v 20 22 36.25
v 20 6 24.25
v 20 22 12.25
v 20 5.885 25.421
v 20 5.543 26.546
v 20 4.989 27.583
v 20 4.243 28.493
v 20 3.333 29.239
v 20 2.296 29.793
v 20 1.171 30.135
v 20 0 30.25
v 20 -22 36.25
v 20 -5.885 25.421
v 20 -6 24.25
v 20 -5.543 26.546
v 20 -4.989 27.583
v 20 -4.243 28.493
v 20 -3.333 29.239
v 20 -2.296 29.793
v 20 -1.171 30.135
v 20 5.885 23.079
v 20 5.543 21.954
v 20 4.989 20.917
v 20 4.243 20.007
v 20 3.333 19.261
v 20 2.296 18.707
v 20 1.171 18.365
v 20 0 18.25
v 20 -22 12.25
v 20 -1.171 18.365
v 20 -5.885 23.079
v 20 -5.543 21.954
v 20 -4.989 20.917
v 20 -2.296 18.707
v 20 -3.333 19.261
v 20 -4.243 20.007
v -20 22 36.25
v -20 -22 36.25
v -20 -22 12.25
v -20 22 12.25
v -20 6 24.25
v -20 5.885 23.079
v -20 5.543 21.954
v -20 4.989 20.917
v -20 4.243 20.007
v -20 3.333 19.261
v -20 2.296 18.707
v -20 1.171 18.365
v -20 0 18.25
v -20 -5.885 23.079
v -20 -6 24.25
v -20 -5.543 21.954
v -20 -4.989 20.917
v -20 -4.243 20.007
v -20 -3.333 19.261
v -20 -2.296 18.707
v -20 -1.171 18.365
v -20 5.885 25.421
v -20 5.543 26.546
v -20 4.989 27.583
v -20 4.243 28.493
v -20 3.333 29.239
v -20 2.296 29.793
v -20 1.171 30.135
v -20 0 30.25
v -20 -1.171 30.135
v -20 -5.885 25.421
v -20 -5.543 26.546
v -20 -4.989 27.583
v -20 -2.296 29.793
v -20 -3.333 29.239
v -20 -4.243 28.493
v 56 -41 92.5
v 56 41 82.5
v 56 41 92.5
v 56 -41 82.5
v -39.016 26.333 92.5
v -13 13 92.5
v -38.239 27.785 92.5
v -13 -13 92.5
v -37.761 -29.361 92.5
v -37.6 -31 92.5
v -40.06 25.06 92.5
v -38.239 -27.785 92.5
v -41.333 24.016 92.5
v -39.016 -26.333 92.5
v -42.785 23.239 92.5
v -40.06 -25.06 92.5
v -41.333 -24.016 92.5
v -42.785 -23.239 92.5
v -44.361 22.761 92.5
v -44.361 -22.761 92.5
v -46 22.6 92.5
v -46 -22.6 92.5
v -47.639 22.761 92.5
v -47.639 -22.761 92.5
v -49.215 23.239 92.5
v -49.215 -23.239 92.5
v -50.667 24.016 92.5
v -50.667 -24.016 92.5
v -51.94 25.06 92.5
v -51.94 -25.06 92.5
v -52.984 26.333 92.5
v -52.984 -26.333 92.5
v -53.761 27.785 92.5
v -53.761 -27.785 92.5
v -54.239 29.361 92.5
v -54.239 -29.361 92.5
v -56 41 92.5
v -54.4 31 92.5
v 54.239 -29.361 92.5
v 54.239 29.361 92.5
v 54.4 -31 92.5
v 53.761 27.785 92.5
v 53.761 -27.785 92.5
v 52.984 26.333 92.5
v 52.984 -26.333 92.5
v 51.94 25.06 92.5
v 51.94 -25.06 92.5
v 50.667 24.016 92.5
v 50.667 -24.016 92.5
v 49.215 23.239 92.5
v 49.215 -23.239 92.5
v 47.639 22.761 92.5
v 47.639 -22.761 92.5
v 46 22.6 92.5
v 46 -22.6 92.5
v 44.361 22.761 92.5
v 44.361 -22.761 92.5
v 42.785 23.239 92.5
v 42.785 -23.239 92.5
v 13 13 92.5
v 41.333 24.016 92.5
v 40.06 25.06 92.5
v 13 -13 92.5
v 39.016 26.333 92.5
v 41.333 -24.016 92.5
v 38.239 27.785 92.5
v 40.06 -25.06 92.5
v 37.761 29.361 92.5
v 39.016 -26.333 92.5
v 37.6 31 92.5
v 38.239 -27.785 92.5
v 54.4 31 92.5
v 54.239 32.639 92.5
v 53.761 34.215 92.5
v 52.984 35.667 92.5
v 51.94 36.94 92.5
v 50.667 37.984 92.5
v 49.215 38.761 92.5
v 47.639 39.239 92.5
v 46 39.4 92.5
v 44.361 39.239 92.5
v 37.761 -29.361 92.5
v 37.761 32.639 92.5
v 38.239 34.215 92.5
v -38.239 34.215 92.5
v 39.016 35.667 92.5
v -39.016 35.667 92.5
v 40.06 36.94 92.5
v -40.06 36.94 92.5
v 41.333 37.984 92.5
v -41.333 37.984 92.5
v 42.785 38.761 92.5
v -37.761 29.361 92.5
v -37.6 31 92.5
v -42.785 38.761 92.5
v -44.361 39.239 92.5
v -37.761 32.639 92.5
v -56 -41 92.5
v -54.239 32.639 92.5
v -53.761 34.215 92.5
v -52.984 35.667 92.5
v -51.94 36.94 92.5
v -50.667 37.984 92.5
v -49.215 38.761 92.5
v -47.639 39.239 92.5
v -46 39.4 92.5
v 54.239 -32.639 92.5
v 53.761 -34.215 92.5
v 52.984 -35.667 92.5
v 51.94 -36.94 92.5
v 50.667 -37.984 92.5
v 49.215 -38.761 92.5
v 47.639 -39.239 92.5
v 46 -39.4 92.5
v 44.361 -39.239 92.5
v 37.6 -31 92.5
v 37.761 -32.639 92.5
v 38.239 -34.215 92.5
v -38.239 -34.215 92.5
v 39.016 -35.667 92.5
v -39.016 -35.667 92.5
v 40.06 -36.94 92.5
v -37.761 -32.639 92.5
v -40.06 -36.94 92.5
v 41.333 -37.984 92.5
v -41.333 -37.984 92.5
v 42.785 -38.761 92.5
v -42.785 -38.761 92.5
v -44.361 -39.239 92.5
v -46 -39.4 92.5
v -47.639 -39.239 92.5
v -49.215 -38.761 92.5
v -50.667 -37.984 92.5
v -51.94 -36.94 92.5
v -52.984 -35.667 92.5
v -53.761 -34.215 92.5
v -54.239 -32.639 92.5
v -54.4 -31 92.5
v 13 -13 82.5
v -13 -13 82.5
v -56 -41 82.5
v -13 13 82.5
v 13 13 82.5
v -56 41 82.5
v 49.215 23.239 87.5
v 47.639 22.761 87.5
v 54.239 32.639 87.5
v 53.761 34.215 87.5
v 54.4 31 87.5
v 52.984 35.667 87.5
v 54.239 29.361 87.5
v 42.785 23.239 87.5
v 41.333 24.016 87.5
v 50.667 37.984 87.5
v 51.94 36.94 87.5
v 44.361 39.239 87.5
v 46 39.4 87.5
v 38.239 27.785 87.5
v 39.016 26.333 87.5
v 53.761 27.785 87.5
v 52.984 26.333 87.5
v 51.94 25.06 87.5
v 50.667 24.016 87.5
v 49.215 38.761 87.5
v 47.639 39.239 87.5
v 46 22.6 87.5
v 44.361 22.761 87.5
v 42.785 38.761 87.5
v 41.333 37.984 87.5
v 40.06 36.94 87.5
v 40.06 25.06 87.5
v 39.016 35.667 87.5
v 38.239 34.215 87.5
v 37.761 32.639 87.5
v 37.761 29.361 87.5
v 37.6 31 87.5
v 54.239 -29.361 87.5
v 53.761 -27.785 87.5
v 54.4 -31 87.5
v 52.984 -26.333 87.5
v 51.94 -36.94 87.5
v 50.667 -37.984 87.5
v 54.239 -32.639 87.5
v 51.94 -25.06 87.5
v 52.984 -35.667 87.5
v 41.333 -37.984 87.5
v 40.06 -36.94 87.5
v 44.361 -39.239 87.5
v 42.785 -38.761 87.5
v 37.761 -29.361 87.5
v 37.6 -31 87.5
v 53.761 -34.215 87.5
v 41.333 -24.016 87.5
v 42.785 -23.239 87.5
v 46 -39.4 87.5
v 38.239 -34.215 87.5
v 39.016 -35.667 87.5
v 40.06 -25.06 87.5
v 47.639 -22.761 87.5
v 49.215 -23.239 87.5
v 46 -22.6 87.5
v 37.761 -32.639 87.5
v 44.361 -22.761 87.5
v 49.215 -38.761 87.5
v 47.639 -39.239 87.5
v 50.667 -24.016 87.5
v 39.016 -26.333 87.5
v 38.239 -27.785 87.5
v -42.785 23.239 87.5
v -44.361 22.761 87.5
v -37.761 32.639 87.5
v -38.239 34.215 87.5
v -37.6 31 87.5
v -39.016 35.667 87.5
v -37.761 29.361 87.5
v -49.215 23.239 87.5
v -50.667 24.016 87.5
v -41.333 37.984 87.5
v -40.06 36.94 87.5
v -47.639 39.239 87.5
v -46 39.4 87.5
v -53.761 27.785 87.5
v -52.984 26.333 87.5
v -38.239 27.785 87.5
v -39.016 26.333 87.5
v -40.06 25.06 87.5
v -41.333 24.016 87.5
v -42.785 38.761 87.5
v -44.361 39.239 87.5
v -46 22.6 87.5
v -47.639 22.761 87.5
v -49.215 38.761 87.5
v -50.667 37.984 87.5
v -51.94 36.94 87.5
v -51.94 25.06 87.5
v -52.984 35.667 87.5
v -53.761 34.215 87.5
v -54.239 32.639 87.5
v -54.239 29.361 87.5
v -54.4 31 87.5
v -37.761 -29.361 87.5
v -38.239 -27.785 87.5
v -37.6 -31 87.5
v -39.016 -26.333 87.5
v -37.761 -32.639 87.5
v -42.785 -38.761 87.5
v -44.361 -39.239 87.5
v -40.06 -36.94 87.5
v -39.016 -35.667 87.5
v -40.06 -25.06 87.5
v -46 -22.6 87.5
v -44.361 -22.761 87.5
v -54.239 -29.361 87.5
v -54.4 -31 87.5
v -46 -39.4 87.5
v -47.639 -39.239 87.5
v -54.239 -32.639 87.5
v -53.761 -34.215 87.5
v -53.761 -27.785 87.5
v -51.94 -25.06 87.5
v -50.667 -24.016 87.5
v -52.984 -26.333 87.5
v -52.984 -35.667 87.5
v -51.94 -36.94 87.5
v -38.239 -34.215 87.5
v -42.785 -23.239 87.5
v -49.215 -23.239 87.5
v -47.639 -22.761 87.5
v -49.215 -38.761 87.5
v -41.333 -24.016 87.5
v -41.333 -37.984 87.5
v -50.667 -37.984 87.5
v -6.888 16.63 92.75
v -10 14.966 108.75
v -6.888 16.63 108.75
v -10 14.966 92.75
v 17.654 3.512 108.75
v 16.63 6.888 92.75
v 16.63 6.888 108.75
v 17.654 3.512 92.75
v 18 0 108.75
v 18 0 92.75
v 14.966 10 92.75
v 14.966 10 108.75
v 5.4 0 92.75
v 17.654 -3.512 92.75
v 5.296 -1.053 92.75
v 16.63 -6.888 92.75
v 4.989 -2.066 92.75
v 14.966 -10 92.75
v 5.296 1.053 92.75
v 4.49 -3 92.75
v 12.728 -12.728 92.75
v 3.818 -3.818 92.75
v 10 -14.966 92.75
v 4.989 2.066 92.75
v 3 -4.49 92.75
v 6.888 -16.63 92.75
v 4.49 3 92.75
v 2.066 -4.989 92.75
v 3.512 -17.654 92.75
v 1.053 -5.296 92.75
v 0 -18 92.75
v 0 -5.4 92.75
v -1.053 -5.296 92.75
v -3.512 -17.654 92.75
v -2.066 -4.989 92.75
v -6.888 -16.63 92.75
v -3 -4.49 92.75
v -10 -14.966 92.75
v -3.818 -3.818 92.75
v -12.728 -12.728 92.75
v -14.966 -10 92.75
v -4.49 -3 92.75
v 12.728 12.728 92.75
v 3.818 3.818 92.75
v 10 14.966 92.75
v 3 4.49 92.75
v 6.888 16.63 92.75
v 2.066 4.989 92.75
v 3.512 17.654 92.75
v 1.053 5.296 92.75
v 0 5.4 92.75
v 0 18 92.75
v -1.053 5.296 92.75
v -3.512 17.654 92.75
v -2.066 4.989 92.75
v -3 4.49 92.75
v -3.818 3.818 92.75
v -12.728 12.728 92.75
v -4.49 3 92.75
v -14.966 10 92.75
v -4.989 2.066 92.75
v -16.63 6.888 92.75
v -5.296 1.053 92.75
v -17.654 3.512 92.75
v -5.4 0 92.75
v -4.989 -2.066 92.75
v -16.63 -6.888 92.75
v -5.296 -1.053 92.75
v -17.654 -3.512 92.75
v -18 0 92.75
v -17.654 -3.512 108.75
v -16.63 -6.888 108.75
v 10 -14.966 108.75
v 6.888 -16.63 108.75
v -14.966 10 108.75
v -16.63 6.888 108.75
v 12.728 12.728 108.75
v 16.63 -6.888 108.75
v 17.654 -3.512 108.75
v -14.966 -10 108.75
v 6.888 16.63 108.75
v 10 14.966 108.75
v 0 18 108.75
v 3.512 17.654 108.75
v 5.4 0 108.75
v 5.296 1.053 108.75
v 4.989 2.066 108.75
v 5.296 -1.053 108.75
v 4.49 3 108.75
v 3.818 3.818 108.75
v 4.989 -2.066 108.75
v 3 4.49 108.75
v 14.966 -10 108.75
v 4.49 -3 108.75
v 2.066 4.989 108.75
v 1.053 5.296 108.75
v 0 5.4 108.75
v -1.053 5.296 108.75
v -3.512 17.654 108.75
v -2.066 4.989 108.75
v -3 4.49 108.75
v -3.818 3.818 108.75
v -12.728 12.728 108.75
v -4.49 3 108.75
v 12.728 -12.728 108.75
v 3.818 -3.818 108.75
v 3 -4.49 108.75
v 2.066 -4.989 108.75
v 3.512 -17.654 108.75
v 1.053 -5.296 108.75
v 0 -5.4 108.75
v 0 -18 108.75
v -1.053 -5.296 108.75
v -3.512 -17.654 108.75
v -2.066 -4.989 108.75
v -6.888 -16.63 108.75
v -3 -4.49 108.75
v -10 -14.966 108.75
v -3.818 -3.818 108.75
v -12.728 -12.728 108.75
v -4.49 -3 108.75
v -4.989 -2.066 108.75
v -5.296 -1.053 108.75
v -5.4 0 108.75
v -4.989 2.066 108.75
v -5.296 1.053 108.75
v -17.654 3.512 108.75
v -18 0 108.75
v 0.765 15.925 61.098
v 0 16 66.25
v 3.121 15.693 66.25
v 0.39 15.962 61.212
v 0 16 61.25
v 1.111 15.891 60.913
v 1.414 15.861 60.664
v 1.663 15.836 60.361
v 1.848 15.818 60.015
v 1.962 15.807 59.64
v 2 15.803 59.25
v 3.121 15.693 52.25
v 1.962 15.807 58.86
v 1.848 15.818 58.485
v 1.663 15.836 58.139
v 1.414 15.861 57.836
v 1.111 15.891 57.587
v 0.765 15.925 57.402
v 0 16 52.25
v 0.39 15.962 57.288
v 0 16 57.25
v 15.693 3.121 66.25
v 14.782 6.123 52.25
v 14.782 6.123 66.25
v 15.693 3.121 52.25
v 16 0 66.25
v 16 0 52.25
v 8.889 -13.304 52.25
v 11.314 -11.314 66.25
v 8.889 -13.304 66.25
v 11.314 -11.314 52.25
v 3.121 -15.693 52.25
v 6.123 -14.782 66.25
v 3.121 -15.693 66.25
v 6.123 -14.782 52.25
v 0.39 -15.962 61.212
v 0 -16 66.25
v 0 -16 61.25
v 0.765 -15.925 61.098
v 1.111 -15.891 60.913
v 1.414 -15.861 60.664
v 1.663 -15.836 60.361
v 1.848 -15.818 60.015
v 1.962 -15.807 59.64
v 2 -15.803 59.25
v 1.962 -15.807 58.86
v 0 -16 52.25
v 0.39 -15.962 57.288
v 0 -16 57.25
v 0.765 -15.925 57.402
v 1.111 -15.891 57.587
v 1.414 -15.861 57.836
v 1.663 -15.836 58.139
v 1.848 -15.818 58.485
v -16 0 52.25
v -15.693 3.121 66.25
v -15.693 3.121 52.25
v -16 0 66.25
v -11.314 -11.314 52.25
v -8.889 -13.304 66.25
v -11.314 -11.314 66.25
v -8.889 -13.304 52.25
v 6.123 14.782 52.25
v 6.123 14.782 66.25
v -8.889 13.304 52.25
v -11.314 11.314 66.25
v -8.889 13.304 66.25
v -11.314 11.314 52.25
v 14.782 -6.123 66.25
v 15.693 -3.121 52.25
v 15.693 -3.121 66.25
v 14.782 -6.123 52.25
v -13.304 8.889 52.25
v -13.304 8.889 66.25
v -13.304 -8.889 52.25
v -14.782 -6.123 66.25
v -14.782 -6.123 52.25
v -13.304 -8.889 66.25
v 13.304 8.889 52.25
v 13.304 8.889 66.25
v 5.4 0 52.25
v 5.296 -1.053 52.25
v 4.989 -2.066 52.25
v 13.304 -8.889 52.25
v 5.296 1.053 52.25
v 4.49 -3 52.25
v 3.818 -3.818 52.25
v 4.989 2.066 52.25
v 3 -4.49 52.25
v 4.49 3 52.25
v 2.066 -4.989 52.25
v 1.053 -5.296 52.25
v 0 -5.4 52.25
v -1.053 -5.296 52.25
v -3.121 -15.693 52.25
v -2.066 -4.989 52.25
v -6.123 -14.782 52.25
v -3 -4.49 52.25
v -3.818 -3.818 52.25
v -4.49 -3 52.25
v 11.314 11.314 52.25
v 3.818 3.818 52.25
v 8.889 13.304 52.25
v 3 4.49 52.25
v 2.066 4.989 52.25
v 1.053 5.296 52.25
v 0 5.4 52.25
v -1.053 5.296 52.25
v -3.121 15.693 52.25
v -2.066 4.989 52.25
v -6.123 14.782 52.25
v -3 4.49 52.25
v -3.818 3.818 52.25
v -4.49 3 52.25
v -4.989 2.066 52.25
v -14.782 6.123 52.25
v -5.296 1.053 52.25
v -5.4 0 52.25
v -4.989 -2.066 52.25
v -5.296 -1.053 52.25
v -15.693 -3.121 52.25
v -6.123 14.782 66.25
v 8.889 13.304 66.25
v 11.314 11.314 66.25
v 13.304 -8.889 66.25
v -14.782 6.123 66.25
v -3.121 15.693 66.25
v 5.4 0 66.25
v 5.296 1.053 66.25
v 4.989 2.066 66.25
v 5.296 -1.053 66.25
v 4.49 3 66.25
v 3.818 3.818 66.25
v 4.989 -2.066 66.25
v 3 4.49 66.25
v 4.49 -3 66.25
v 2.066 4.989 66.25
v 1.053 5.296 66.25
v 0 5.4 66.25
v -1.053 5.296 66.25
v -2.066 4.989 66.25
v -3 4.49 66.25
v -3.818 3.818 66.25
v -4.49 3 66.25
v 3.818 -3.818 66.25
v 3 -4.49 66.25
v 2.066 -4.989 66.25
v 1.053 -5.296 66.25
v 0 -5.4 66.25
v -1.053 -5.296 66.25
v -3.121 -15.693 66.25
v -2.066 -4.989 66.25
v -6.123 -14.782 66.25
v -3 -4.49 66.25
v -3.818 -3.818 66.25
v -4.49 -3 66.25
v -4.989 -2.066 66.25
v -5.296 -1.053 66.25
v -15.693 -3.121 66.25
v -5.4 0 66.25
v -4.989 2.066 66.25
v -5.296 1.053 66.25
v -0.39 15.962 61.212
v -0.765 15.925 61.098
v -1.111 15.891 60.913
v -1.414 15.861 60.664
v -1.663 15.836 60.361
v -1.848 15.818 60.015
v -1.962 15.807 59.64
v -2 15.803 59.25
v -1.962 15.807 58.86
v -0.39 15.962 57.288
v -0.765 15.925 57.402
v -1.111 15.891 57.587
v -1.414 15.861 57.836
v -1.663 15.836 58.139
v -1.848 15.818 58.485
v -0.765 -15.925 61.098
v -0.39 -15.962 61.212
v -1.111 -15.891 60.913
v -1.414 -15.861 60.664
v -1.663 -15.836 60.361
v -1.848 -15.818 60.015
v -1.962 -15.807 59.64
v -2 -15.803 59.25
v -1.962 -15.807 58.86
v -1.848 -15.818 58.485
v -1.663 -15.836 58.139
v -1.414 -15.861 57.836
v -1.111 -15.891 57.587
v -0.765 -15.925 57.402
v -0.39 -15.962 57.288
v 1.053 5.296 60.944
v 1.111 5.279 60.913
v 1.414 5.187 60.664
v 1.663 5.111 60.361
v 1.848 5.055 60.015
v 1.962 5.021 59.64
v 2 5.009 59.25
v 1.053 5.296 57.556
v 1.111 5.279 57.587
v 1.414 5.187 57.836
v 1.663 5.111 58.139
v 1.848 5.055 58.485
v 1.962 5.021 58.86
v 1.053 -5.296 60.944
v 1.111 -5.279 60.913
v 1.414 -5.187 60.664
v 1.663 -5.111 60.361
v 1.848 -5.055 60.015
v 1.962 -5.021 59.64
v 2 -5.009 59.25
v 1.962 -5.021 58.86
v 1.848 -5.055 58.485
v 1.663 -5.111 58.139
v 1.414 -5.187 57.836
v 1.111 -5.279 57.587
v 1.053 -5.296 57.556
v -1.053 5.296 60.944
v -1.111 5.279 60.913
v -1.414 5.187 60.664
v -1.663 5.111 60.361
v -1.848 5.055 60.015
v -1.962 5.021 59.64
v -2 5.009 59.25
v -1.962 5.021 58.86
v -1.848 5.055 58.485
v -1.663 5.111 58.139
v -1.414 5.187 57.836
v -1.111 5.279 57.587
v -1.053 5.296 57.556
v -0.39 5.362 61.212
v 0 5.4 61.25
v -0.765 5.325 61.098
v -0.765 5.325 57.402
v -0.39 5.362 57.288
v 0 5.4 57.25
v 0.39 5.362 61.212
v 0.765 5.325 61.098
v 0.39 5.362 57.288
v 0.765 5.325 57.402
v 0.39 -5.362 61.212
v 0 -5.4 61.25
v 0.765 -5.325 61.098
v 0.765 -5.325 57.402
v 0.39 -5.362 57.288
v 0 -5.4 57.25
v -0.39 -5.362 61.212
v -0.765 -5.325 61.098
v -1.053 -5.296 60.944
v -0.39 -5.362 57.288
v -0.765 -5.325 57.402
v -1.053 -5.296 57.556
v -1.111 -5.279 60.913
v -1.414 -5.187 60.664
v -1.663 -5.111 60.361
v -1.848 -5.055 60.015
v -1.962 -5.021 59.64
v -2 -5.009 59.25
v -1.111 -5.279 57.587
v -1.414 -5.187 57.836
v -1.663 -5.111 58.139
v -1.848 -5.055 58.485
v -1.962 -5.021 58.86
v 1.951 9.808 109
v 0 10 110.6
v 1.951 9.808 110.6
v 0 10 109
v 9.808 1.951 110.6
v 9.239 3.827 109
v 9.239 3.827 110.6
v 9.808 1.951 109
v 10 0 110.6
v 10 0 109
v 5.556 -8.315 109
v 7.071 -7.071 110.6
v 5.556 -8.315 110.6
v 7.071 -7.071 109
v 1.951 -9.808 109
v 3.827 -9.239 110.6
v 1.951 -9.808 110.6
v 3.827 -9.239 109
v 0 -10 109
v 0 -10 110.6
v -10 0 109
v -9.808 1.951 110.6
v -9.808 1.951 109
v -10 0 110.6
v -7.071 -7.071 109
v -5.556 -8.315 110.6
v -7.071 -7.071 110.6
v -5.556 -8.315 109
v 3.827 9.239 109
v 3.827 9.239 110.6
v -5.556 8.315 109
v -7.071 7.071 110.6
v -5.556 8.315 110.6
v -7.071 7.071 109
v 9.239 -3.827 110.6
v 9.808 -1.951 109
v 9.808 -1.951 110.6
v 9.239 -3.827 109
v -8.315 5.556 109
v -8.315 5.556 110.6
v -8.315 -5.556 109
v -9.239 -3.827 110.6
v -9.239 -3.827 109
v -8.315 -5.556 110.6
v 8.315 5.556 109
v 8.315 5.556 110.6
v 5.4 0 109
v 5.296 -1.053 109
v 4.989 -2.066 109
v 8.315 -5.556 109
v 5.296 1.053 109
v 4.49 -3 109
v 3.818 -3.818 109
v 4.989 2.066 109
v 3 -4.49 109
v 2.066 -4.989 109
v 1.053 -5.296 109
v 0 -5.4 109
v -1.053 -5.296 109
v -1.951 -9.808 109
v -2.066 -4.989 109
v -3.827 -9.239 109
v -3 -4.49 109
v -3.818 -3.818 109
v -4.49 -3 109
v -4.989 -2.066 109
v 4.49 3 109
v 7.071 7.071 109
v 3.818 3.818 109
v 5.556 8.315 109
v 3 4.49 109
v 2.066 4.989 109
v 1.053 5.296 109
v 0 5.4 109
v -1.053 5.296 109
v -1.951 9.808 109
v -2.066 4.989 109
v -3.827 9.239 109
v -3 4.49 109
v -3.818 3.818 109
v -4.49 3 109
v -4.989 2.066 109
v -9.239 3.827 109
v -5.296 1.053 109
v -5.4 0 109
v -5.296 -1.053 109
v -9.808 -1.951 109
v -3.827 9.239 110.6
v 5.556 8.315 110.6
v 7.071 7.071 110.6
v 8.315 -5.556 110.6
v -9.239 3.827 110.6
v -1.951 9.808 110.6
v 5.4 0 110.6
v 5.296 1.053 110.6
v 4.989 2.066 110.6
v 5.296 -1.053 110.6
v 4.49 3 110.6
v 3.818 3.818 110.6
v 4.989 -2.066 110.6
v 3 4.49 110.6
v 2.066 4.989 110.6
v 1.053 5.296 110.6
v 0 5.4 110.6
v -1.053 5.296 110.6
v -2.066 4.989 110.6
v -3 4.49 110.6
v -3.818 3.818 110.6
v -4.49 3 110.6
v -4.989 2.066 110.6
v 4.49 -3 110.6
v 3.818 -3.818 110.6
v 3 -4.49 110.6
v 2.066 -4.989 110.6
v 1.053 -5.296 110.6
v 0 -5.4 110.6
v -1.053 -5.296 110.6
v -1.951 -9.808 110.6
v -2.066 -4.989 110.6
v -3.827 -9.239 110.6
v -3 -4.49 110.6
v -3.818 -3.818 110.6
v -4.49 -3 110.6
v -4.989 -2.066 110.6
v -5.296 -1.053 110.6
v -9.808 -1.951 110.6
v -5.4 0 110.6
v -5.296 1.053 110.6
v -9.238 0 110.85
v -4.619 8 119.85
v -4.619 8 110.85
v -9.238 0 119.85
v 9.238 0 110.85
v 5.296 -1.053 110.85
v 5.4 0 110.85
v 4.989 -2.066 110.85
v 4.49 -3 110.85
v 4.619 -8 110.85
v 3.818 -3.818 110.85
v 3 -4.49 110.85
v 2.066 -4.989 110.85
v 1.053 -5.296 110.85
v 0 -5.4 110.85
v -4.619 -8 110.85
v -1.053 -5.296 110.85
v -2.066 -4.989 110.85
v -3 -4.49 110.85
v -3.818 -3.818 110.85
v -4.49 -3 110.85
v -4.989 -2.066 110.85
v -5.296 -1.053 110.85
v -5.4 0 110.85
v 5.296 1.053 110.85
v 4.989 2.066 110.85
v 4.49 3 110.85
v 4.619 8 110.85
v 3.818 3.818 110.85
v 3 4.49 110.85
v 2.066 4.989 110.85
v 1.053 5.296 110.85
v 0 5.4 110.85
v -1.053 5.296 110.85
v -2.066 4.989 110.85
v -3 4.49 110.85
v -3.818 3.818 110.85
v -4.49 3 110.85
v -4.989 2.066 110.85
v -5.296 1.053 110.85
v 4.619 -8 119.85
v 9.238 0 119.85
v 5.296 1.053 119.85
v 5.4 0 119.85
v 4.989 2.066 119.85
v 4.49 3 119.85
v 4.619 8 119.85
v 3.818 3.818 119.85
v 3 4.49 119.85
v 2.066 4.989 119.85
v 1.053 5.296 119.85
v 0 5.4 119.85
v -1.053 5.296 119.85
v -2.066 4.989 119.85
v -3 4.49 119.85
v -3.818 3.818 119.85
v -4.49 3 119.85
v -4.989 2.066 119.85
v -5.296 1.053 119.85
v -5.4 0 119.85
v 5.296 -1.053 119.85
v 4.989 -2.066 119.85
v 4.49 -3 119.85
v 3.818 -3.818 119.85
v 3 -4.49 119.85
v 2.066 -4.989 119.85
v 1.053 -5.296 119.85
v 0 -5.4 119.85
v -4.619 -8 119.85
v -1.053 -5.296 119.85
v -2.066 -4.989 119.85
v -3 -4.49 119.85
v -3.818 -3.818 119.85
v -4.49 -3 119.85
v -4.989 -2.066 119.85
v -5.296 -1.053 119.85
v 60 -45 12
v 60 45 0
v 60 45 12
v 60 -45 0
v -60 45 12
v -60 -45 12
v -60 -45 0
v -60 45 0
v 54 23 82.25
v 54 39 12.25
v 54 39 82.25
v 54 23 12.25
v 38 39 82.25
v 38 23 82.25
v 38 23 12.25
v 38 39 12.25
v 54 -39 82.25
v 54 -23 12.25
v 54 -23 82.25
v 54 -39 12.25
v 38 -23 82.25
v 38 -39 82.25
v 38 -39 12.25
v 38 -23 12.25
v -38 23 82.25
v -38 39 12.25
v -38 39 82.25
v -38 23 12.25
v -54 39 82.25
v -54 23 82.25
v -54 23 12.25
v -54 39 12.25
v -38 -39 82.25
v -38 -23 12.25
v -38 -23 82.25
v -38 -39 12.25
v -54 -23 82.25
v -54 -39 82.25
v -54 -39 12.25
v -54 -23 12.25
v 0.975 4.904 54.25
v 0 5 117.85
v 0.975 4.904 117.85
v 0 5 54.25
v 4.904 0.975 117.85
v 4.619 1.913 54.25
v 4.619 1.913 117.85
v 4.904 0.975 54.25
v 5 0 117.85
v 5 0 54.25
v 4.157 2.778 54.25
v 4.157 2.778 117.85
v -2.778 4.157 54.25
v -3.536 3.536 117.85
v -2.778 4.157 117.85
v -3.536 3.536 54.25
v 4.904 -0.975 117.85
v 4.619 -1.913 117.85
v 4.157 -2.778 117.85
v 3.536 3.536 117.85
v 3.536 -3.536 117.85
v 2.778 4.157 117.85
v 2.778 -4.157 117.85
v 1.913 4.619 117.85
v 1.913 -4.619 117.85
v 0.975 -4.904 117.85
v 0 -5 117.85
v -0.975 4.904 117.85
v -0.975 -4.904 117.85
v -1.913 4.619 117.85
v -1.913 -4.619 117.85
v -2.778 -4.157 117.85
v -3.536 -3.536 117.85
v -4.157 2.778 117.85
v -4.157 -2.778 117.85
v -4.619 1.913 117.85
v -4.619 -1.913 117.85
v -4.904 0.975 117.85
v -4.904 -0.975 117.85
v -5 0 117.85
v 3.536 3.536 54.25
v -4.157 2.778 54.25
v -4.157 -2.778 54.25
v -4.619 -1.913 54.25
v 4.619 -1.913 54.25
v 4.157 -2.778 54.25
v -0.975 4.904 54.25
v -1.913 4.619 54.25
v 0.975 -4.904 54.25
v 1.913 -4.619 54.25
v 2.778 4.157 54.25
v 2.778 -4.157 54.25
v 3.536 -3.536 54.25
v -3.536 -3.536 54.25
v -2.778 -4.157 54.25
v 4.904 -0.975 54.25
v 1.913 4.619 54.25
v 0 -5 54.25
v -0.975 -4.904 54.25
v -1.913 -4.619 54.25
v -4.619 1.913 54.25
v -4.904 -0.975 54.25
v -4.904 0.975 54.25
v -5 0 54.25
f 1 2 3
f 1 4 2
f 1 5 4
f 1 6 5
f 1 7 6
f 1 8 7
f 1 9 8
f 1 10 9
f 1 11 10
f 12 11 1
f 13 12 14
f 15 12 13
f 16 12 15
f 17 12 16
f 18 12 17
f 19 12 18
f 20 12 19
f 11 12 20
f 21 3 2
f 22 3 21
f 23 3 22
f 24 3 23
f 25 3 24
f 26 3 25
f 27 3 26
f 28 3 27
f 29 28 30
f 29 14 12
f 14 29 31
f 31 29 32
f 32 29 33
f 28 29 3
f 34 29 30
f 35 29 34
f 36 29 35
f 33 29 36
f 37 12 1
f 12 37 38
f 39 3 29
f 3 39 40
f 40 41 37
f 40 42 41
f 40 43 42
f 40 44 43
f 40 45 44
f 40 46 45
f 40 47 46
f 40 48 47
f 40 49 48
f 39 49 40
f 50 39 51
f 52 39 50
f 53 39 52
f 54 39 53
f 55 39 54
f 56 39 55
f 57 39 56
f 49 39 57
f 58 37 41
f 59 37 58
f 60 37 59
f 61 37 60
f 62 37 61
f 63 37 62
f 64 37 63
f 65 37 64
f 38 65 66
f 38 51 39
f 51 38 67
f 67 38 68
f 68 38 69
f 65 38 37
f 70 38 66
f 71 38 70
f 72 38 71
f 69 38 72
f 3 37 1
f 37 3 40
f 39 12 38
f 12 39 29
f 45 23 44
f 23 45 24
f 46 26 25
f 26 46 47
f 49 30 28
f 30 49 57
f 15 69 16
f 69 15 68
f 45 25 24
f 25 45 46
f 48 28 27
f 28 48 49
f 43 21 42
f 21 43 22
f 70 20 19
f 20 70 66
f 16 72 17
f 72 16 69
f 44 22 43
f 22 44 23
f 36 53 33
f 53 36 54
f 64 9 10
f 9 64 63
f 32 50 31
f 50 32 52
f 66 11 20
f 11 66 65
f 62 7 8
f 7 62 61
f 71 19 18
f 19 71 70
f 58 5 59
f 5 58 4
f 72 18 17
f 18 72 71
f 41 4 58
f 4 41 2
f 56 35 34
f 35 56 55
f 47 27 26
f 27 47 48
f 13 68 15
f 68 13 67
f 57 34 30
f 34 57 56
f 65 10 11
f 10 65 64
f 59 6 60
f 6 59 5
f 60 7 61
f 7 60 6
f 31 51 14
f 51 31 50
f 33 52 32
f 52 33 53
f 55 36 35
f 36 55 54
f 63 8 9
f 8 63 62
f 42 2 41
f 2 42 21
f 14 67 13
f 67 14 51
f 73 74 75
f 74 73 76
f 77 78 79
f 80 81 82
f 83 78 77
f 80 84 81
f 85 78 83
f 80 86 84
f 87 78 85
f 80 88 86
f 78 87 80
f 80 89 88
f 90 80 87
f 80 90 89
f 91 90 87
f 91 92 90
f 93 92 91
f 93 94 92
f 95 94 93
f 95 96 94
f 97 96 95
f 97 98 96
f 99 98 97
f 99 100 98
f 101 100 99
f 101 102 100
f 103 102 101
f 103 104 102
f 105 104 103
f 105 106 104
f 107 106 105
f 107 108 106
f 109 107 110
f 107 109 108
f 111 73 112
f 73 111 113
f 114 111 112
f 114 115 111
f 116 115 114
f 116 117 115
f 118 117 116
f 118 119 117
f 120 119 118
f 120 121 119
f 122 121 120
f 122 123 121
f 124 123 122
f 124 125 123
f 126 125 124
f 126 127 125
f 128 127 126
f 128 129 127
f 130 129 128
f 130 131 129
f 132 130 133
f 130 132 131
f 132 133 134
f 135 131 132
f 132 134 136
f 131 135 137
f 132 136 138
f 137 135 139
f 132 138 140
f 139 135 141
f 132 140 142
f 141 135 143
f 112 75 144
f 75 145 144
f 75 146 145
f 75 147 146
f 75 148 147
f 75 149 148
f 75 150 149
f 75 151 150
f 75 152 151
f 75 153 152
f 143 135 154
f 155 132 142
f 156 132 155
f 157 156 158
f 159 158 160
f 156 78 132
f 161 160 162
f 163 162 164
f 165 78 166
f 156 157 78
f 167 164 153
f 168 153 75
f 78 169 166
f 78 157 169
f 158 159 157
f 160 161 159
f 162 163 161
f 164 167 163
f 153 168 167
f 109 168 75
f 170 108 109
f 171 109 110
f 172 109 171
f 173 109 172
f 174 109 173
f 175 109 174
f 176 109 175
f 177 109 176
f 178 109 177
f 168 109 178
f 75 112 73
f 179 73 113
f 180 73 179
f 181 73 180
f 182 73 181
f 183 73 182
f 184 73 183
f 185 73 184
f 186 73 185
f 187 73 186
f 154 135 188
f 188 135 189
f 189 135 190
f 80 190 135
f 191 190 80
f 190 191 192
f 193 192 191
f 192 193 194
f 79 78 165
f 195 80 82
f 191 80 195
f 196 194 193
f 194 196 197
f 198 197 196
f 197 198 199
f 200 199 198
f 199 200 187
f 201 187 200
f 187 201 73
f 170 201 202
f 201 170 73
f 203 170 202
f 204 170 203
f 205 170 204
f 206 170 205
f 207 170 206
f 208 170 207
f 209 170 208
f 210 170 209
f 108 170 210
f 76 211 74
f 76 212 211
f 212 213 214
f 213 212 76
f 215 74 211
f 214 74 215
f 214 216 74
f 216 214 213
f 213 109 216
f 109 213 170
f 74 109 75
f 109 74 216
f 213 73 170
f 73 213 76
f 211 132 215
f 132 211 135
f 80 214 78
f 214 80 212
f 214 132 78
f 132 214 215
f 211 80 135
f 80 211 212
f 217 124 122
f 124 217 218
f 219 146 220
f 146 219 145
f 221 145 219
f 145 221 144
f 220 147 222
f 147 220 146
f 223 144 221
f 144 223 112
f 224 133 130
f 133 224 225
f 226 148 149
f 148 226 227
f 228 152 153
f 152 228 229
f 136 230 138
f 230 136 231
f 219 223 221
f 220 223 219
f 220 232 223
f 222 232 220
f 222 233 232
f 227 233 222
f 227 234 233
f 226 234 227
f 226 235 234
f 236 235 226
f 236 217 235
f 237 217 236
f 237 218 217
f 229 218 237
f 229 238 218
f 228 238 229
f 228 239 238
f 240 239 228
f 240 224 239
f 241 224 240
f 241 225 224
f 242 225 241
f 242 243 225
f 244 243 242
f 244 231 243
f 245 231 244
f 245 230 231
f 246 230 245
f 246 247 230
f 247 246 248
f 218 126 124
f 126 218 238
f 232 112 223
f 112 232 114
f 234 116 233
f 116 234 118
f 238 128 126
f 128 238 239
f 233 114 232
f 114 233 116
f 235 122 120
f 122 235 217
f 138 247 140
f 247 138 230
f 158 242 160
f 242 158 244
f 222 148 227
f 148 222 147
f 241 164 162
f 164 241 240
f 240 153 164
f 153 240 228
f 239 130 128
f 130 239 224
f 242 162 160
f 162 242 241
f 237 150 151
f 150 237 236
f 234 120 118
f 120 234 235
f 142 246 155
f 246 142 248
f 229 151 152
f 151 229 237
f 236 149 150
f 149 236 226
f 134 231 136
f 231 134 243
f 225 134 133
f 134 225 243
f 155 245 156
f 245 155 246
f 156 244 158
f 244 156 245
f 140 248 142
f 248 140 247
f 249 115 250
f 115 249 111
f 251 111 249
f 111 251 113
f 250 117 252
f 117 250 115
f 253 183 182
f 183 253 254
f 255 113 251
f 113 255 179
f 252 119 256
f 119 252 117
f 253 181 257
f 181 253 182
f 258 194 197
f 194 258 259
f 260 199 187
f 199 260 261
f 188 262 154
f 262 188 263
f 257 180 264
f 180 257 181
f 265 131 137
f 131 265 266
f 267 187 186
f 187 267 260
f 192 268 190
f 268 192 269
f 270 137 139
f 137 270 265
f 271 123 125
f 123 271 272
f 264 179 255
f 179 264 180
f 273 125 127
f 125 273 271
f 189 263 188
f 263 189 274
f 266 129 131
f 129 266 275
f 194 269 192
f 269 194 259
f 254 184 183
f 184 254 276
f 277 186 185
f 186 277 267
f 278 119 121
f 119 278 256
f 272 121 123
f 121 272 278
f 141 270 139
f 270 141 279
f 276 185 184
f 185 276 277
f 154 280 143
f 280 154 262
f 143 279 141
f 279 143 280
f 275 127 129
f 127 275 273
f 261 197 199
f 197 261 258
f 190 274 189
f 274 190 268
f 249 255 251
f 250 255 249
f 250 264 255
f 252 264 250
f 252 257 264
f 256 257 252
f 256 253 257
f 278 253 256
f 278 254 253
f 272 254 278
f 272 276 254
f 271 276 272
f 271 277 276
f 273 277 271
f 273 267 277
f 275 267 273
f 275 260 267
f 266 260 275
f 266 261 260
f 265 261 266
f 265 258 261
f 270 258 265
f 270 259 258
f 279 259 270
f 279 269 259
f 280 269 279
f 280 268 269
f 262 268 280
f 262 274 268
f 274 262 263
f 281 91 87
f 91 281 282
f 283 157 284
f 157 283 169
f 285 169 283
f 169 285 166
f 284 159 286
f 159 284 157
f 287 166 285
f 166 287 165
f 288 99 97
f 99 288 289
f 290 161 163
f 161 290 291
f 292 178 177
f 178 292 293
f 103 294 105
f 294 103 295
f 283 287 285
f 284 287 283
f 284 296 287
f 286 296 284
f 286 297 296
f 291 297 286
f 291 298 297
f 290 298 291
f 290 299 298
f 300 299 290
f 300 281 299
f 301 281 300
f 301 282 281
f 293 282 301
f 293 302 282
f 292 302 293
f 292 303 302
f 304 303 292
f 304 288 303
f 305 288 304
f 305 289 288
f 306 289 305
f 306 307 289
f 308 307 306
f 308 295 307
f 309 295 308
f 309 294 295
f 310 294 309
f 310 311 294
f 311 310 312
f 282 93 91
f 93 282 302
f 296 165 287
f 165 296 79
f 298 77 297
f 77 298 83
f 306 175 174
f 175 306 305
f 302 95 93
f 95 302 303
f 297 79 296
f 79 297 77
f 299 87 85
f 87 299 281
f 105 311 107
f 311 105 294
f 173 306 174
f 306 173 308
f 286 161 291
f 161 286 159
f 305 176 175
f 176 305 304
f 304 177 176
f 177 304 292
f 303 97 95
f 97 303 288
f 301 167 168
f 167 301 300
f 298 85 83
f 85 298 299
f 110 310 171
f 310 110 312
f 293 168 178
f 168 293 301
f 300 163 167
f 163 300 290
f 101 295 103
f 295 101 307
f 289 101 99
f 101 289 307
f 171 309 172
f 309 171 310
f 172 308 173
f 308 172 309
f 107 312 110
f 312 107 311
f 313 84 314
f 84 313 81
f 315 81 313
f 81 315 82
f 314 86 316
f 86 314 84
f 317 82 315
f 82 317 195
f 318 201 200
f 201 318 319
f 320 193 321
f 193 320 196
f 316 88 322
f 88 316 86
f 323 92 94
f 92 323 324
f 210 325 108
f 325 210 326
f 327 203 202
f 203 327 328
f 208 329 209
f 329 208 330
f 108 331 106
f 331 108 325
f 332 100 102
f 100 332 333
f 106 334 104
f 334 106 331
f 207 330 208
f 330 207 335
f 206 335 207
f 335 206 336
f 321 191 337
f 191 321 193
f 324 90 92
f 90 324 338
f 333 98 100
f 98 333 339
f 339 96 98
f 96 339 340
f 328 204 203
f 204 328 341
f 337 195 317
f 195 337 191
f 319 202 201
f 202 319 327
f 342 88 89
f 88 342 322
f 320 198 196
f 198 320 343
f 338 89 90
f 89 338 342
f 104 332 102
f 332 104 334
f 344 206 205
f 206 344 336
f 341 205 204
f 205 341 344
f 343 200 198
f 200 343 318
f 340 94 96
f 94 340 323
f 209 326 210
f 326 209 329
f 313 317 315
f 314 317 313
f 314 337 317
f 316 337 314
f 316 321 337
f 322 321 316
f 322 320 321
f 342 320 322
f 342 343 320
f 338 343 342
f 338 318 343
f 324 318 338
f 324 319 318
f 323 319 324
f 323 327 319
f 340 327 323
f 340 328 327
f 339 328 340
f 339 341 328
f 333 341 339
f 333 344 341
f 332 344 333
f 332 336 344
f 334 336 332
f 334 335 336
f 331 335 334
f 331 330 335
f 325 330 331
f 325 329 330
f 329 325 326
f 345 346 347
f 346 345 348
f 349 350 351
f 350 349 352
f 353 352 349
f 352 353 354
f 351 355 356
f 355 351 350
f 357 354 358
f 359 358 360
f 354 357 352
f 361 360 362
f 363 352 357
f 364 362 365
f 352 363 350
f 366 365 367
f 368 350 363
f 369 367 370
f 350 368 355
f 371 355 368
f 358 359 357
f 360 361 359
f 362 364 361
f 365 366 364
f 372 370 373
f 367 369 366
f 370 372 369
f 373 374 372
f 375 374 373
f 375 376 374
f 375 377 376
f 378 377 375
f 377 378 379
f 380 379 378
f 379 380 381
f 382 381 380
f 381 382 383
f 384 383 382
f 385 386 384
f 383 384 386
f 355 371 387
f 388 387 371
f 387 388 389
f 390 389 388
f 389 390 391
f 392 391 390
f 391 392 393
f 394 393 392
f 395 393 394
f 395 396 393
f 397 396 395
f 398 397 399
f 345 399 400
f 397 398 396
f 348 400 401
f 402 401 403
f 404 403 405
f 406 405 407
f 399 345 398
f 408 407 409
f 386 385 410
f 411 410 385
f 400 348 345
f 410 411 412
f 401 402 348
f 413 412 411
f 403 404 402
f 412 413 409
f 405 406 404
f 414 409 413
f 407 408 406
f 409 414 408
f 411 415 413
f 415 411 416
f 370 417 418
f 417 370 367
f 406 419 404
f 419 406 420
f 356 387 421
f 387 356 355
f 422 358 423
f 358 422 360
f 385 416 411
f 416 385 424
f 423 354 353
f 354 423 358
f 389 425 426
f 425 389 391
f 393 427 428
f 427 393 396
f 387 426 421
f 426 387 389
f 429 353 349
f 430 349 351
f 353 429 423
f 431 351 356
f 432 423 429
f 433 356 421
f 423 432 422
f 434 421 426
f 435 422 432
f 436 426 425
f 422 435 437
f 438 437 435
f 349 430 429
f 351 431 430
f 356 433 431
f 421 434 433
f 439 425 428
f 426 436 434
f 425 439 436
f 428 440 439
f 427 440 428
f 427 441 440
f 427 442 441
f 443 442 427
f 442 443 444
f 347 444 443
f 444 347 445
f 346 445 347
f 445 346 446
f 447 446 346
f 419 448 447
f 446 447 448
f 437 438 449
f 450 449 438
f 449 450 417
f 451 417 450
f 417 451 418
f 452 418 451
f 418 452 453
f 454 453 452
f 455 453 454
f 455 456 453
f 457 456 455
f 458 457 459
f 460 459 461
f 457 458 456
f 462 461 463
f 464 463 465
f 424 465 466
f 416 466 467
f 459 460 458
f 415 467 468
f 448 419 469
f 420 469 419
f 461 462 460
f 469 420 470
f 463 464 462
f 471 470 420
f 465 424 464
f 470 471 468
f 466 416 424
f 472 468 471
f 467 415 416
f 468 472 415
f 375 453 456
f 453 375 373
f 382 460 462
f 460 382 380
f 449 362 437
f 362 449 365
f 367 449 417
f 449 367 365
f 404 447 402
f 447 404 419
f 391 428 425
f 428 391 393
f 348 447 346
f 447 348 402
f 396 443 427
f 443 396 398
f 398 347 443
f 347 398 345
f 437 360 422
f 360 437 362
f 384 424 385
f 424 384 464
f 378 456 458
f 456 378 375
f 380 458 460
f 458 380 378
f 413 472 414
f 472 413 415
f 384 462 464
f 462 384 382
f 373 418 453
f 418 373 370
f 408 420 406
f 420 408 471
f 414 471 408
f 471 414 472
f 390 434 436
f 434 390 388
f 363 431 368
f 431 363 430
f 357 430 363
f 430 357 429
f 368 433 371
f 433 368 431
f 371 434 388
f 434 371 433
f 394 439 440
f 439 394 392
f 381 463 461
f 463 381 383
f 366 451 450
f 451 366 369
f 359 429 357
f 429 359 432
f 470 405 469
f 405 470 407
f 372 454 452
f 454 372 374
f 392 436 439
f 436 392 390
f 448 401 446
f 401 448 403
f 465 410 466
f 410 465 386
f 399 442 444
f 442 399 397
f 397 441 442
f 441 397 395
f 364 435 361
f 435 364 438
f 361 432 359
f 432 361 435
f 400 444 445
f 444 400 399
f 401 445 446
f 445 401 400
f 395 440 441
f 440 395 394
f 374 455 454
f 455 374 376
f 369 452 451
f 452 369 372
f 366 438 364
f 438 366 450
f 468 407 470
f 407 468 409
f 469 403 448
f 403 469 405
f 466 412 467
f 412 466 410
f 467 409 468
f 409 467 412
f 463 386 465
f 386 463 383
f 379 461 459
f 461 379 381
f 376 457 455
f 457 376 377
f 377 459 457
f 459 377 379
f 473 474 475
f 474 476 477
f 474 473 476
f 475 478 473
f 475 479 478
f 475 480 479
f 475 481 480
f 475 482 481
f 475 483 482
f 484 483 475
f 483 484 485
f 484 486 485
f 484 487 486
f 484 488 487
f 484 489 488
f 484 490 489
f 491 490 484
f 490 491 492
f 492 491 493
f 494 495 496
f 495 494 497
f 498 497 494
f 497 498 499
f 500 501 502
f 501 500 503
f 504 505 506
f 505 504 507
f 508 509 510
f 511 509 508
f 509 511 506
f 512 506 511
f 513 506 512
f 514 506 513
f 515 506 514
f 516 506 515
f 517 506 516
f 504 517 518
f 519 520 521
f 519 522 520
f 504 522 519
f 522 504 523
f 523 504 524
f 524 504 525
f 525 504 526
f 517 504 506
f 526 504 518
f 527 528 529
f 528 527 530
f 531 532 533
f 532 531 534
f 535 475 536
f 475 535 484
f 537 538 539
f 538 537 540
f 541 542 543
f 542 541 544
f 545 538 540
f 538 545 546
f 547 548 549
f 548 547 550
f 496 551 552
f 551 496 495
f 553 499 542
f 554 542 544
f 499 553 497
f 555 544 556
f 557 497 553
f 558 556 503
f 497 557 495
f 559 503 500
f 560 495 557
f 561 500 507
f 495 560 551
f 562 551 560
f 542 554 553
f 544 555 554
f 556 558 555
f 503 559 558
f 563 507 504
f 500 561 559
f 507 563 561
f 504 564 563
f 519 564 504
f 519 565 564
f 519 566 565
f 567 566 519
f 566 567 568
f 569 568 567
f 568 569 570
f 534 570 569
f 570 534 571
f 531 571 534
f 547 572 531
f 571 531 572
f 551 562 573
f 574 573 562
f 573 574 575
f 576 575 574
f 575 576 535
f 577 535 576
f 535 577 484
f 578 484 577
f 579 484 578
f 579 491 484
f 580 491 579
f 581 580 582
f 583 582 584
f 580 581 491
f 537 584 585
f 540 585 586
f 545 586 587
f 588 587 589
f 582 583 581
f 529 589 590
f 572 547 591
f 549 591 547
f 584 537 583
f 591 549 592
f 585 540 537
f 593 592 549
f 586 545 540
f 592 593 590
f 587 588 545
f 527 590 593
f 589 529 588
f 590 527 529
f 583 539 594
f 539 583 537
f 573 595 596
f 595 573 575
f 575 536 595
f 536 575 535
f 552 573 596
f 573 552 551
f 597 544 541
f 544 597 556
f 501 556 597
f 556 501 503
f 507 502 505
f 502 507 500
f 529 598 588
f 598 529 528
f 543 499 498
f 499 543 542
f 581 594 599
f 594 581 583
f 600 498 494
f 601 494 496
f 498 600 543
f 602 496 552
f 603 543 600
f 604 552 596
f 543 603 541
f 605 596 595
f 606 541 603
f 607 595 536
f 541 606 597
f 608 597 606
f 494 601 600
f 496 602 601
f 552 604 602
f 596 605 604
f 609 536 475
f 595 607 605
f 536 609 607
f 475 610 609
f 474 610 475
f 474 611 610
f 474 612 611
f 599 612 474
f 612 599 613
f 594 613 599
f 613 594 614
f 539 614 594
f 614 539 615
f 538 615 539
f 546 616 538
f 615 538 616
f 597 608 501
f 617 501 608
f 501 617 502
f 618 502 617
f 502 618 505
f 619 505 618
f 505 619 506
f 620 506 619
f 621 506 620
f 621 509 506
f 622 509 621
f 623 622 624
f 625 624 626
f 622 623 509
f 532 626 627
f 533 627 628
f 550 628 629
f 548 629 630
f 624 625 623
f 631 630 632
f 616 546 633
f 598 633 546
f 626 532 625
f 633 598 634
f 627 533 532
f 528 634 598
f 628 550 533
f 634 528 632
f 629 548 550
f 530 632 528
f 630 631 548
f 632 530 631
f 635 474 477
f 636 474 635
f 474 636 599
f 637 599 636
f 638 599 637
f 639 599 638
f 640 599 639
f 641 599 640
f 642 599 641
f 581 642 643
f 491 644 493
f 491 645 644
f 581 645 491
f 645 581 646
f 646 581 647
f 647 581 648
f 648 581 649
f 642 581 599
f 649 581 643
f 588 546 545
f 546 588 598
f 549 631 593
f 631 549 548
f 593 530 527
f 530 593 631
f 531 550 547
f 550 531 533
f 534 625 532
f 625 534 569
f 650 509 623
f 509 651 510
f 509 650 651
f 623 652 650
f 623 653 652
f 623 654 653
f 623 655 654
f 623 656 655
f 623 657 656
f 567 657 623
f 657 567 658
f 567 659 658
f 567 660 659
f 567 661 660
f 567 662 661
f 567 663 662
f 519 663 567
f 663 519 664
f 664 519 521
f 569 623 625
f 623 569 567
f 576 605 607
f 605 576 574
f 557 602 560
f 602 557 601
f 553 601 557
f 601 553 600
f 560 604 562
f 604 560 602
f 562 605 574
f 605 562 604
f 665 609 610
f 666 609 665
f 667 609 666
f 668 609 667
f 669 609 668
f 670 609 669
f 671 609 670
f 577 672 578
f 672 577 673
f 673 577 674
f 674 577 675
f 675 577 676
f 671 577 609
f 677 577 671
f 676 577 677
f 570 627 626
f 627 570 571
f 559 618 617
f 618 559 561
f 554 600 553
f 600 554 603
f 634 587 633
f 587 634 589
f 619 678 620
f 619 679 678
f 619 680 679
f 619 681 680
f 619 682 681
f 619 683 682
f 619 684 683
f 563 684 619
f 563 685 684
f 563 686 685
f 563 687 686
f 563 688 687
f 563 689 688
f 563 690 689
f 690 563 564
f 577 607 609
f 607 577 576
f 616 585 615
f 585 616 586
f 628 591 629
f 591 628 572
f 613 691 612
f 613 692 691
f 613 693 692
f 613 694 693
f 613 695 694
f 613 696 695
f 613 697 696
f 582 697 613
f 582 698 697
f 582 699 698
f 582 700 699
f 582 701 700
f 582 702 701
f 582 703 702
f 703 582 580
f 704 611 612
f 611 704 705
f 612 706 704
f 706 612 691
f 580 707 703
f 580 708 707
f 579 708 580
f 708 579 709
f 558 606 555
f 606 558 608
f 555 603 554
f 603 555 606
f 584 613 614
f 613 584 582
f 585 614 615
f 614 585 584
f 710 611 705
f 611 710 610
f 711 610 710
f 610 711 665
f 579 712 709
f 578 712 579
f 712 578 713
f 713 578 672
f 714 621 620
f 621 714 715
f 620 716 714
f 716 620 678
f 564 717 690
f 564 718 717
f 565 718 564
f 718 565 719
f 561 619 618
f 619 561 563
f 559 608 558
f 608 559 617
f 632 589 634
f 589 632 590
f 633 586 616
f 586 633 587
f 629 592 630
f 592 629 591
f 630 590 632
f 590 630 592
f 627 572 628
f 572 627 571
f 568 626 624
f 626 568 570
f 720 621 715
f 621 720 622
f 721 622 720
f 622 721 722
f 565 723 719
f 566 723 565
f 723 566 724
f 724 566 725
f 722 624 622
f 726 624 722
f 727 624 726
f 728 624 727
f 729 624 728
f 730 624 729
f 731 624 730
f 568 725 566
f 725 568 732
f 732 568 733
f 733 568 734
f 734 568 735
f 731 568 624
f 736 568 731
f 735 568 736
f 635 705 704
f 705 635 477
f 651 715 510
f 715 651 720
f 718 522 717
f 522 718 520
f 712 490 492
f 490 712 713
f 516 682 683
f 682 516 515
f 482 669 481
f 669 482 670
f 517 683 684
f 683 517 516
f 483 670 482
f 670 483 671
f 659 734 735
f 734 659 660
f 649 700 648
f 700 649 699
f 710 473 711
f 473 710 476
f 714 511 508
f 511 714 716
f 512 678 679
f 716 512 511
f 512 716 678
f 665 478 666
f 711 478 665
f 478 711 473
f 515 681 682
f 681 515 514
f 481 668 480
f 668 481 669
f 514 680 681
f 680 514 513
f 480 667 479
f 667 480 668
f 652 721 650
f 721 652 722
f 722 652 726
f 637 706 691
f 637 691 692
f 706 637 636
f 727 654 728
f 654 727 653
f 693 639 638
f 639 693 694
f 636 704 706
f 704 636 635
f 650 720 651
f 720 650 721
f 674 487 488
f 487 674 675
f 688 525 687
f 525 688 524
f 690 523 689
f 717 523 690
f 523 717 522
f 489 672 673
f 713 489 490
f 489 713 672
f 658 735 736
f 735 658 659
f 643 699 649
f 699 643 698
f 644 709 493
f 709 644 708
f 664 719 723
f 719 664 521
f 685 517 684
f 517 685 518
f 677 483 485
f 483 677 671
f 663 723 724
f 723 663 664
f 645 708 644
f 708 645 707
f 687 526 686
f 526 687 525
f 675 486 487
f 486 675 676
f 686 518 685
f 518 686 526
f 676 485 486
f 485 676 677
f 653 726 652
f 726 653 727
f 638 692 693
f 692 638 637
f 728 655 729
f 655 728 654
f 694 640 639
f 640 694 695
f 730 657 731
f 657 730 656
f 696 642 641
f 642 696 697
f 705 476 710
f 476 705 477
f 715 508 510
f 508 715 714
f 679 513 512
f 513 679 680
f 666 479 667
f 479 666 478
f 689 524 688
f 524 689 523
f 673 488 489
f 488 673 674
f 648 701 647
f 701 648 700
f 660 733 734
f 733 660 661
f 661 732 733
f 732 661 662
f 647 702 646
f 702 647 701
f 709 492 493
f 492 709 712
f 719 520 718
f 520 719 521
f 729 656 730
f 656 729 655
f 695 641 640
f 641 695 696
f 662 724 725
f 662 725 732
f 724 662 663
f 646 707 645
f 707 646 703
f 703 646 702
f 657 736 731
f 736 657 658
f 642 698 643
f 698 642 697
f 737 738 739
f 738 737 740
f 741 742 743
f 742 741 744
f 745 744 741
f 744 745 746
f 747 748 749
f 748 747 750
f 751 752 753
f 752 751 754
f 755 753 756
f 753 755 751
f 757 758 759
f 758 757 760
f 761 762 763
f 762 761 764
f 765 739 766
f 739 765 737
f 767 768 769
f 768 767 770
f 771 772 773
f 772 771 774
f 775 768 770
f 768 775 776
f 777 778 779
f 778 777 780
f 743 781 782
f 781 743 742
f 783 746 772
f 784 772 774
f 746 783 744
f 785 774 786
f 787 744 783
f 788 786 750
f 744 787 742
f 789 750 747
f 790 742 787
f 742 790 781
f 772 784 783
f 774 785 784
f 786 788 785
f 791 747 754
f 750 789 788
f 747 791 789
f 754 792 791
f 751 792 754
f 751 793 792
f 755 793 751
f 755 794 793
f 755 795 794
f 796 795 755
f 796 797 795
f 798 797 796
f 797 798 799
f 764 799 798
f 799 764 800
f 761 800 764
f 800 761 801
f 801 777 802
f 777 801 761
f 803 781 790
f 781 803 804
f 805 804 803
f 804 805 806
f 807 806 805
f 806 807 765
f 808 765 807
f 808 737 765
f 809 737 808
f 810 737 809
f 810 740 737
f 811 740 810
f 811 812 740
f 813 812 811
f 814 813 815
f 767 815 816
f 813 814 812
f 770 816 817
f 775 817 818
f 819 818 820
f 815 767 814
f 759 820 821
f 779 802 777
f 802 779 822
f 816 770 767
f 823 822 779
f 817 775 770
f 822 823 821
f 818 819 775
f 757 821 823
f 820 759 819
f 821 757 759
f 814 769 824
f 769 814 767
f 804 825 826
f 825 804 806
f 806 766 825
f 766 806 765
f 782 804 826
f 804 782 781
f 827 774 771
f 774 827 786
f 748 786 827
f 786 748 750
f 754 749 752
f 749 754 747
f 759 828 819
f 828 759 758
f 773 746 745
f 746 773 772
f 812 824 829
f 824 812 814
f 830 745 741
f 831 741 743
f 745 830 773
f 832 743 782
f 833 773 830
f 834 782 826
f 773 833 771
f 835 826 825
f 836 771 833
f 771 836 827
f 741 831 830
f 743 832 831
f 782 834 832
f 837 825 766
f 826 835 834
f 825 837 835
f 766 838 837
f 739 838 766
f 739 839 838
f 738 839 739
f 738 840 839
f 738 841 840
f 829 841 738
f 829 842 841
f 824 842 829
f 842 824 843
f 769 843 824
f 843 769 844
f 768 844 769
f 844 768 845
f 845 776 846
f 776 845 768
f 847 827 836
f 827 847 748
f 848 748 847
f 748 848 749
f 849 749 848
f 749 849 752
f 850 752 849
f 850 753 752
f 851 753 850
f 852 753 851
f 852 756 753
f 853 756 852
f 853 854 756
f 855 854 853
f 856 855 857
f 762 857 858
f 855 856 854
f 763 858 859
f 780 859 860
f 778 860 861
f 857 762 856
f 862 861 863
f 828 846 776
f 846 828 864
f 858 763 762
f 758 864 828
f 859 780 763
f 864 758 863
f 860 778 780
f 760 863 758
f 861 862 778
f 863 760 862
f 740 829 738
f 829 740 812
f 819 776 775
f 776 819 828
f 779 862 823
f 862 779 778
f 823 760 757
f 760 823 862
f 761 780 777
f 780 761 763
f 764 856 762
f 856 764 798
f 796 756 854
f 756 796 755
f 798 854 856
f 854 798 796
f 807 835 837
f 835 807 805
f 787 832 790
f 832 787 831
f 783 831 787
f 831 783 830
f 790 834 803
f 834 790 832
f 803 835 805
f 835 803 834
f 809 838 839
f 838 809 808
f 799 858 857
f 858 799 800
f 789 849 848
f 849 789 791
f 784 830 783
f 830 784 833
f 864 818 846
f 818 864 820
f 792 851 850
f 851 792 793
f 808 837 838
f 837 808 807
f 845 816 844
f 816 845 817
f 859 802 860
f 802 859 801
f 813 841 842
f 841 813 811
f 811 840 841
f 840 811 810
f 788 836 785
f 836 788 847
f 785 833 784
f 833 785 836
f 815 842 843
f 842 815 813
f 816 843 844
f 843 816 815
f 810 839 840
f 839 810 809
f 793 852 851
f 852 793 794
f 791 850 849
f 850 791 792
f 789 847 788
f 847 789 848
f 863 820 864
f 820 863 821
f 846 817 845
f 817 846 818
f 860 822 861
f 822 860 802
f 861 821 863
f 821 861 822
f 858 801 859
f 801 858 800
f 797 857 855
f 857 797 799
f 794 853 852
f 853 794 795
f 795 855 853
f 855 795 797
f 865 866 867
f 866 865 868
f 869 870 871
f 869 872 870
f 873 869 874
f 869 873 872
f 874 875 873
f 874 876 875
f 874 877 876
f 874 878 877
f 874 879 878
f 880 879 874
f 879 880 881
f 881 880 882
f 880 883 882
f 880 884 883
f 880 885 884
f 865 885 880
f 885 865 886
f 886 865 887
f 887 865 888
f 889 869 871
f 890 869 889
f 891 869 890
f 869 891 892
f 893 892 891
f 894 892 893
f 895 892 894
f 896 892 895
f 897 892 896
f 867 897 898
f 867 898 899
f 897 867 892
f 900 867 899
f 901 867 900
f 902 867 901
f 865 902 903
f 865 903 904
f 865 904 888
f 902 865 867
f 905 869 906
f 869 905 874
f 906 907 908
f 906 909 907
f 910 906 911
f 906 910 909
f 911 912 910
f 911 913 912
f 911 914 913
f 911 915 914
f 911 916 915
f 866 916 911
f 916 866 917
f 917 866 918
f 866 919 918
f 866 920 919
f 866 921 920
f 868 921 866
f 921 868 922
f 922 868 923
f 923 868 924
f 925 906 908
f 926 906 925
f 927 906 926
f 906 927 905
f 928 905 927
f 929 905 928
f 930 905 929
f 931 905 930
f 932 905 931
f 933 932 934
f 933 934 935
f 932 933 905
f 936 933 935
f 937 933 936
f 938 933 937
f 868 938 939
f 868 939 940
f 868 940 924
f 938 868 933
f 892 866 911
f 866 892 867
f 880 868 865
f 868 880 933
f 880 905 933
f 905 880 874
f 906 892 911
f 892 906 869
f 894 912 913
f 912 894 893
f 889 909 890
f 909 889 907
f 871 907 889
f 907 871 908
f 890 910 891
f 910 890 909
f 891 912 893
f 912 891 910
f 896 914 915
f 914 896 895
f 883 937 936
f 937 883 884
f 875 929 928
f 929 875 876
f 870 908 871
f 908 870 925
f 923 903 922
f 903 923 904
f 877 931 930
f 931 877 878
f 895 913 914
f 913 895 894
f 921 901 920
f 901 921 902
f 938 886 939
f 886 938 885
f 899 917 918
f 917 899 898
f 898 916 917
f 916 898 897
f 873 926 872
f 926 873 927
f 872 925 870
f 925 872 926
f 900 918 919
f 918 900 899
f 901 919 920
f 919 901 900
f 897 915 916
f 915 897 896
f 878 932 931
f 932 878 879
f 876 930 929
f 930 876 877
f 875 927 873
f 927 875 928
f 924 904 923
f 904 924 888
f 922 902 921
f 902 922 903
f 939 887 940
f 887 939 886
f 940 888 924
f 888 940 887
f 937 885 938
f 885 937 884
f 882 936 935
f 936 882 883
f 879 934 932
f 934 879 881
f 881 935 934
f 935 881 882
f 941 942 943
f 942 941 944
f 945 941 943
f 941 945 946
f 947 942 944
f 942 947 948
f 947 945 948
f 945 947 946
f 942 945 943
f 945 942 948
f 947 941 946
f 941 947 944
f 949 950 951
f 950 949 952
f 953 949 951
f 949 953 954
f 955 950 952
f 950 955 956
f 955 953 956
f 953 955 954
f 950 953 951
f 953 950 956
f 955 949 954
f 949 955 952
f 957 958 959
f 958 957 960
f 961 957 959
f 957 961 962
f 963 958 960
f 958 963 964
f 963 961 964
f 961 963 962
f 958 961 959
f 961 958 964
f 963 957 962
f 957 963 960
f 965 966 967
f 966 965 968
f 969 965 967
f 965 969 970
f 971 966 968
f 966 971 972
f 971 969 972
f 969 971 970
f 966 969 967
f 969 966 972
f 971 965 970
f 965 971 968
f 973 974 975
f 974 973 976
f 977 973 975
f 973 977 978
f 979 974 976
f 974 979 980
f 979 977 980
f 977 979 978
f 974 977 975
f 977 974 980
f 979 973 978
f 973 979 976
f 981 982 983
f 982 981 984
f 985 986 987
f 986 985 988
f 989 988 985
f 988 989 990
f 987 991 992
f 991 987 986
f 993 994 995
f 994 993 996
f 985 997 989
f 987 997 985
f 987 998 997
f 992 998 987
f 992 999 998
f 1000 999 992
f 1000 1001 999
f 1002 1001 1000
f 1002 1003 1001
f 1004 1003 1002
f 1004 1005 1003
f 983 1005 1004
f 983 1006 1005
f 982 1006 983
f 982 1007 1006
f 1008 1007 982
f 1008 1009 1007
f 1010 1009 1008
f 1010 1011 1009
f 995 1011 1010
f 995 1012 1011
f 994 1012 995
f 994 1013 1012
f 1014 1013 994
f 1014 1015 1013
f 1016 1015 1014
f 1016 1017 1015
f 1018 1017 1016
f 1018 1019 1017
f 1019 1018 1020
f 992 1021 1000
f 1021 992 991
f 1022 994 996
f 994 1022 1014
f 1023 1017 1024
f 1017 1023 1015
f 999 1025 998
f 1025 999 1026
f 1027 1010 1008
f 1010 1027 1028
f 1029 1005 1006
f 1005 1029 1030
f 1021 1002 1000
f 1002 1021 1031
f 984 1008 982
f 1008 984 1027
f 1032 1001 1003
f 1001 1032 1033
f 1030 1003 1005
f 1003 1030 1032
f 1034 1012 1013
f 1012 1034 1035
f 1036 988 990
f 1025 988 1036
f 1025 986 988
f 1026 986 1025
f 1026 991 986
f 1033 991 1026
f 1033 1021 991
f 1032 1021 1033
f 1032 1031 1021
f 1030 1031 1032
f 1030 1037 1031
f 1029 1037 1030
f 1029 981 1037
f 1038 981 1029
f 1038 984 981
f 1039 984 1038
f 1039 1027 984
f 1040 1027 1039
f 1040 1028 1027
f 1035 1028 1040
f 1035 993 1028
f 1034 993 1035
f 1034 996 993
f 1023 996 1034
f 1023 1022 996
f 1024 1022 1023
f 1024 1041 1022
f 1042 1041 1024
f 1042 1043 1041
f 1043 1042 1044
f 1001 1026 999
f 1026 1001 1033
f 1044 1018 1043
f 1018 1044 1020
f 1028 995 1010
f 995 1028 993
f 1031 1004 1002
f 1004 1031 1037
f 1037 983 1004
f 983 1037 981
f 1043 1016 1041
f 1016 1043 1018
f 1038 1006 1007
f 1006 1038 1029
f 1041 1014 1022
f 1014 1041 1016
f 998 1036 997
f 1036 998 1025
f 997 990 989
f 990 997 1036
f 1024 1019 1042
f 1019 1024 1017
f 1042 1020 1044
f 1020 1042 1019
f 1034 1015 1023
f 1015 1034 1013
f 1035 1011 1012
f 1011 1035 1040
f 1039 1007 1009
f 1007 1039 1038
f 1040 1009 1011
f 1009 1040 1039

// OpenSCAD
$fn = 32;

// ------------------------------------------------------------------------
// Arbor press fixture: screw d10, posts 70 mm, gap 16 mm
// Every part is its own module, assembly() places every instance.
// ------------------------------------------------------------------------

// --- part 1 ---
module press_bed() {
  difference() {
    translate([-60, -45, 0]) cube([120, 90, 12]);
  }
}

// --- part 2 ---
module anvil_block() {
  difference() {
    translate([-20, -22, 0]) cube([40, 44, 24]);
    translate([0, 0, 12]) rotate([0, 90, 0]) cylinder(h = 42, d = 12, center = true);
  }
}

// --- part 3 ---
module press_post_a() {
  translate([-8, -8, 0]) cube([16, 16, 70]);
}

// --- part 4 ---
module press_post_b() {
  translate([-8, -8, 0]) cube([16, 16, 70]);
}

// --- part 5 ---
module press_post_c() {
  translate([-8, -8, 0]) cube([16, 16, 70]);
}

// --- part 6 ---
module press_post_d() {
  translate([-8, -8, 0]) cube([16, 16, 70]);
}

// --- part 7 ---
module press_frame() {
  difference() {
    translate([-56, -41, 0]) cube([112, 82, 10]);
    translate([-13, -13, -1]) cube([26, 26, 12]);
    translate([46, 31, 5]) cylinder(h = 6, d = 16.8);
    translate([46, -31, 5]) cylinder(h = 6, d = 16.8);
    translate([-46, 31, 5]) cylinder(h = 6, d = 16.8);
    translate([-46, -31, 5]) cylinder(h = 6, d = 16.8);
  }
}

// --- part 8 ---
module guide_ring() {
  difference() {
      translate([0, 0, 0]) cylinder(h = 16, d = 36);
      translate([0, 0, -1]) cylinder(h = 18, d = 10.8);
    }
}

// --- part 9 ---
module press_screw() {
  translate([0, 0, -31.8]) cylinder(h = 63.6, d = 10);
}

// --- part 10 ---
module press_head() {
  difference() {
    cylinder(h = 14, d = 32);
    translate([0, 0, -1]) cylinder(h = 16, d = 10.8);
    translate([0, 0, 7]) rotate([90, 0, 0]) cylinder(h = 34, d = 4, center = true);
  }
}

// --- part 11 ---
module nut_washer() {
  difference() {
      translate([0, 0, 0]) cylinder(h = 1.6, d = 20);
      translate([0, 0, -1]) cylinder(h = 3.6, d = 10.8);
    }
}

// --- part 12 ---
module press_nut() {
  difference() {
    linear_extrude(height = 9) polygon(points = [[9.238, 0], [4.619, 8], [-4.619, 8], [-9.238, 0], [-4.619, -8], [4.619, -8]]);
    translate([0, 0, -1]) cylinder(h = 11, d = 10.8);
  }
}

// --- assembly ---
module assembly() {
  color([0.80, 0.24, 0.20]) translate([0, 0, 0]) rotate([0, 0, 0]) press_bed();
  color([0.20, 0.45, 0.75]) translate([0, 0, 12.25]) rotate([0, 0, 0]) anvil_block();
  color([0.25, 0.62, 0.32]) translate([46, 31, 12.25]) rotate([0, 0, 0]) press_post_a();
  color([0.92, 0.70, 0.18]) translate([46, -31, 12.25]) rotate([0, 0, 0]) press_post_b();
  color([0.58, 0.35, 0.70]) translate([-46, 31, 12.25]) rotate([0, 0, 0]) press_post_c();
  color([0.16, 0.66, 0.66]) translate([-46, -31, 12.25]) rotate([0, 0, 0]) press_post_d();
  color([0.85, 0.48, 0.18]) translate([0, 0, 82.5]) rotate([0, 0, 0]) press_frame();
  color([0.55, 0.60, 0.65]) translate([0, 0, 92.75]) rotate([0, 0, 0]) guide_ring();
  color([0.75, 0.30, 0.55]) translate([0, 0, 86.05]) rotate([0, 0, 0]) press_screw();
  color([0.42, 0.52, 0.28]) translate([0, 0, 52.25]) rotate([0, 0, 0]) press_head();
  color([0.80, 0.24, 0.20]) translate([0, 0, 109]) rotate([0, 0, 0]) nut_washer();
  color([0.20, 0.45, 0.75]) translate([0, 0, 110.85]) rotate([0, 0, 0]) press_nut();
}

assembly();
